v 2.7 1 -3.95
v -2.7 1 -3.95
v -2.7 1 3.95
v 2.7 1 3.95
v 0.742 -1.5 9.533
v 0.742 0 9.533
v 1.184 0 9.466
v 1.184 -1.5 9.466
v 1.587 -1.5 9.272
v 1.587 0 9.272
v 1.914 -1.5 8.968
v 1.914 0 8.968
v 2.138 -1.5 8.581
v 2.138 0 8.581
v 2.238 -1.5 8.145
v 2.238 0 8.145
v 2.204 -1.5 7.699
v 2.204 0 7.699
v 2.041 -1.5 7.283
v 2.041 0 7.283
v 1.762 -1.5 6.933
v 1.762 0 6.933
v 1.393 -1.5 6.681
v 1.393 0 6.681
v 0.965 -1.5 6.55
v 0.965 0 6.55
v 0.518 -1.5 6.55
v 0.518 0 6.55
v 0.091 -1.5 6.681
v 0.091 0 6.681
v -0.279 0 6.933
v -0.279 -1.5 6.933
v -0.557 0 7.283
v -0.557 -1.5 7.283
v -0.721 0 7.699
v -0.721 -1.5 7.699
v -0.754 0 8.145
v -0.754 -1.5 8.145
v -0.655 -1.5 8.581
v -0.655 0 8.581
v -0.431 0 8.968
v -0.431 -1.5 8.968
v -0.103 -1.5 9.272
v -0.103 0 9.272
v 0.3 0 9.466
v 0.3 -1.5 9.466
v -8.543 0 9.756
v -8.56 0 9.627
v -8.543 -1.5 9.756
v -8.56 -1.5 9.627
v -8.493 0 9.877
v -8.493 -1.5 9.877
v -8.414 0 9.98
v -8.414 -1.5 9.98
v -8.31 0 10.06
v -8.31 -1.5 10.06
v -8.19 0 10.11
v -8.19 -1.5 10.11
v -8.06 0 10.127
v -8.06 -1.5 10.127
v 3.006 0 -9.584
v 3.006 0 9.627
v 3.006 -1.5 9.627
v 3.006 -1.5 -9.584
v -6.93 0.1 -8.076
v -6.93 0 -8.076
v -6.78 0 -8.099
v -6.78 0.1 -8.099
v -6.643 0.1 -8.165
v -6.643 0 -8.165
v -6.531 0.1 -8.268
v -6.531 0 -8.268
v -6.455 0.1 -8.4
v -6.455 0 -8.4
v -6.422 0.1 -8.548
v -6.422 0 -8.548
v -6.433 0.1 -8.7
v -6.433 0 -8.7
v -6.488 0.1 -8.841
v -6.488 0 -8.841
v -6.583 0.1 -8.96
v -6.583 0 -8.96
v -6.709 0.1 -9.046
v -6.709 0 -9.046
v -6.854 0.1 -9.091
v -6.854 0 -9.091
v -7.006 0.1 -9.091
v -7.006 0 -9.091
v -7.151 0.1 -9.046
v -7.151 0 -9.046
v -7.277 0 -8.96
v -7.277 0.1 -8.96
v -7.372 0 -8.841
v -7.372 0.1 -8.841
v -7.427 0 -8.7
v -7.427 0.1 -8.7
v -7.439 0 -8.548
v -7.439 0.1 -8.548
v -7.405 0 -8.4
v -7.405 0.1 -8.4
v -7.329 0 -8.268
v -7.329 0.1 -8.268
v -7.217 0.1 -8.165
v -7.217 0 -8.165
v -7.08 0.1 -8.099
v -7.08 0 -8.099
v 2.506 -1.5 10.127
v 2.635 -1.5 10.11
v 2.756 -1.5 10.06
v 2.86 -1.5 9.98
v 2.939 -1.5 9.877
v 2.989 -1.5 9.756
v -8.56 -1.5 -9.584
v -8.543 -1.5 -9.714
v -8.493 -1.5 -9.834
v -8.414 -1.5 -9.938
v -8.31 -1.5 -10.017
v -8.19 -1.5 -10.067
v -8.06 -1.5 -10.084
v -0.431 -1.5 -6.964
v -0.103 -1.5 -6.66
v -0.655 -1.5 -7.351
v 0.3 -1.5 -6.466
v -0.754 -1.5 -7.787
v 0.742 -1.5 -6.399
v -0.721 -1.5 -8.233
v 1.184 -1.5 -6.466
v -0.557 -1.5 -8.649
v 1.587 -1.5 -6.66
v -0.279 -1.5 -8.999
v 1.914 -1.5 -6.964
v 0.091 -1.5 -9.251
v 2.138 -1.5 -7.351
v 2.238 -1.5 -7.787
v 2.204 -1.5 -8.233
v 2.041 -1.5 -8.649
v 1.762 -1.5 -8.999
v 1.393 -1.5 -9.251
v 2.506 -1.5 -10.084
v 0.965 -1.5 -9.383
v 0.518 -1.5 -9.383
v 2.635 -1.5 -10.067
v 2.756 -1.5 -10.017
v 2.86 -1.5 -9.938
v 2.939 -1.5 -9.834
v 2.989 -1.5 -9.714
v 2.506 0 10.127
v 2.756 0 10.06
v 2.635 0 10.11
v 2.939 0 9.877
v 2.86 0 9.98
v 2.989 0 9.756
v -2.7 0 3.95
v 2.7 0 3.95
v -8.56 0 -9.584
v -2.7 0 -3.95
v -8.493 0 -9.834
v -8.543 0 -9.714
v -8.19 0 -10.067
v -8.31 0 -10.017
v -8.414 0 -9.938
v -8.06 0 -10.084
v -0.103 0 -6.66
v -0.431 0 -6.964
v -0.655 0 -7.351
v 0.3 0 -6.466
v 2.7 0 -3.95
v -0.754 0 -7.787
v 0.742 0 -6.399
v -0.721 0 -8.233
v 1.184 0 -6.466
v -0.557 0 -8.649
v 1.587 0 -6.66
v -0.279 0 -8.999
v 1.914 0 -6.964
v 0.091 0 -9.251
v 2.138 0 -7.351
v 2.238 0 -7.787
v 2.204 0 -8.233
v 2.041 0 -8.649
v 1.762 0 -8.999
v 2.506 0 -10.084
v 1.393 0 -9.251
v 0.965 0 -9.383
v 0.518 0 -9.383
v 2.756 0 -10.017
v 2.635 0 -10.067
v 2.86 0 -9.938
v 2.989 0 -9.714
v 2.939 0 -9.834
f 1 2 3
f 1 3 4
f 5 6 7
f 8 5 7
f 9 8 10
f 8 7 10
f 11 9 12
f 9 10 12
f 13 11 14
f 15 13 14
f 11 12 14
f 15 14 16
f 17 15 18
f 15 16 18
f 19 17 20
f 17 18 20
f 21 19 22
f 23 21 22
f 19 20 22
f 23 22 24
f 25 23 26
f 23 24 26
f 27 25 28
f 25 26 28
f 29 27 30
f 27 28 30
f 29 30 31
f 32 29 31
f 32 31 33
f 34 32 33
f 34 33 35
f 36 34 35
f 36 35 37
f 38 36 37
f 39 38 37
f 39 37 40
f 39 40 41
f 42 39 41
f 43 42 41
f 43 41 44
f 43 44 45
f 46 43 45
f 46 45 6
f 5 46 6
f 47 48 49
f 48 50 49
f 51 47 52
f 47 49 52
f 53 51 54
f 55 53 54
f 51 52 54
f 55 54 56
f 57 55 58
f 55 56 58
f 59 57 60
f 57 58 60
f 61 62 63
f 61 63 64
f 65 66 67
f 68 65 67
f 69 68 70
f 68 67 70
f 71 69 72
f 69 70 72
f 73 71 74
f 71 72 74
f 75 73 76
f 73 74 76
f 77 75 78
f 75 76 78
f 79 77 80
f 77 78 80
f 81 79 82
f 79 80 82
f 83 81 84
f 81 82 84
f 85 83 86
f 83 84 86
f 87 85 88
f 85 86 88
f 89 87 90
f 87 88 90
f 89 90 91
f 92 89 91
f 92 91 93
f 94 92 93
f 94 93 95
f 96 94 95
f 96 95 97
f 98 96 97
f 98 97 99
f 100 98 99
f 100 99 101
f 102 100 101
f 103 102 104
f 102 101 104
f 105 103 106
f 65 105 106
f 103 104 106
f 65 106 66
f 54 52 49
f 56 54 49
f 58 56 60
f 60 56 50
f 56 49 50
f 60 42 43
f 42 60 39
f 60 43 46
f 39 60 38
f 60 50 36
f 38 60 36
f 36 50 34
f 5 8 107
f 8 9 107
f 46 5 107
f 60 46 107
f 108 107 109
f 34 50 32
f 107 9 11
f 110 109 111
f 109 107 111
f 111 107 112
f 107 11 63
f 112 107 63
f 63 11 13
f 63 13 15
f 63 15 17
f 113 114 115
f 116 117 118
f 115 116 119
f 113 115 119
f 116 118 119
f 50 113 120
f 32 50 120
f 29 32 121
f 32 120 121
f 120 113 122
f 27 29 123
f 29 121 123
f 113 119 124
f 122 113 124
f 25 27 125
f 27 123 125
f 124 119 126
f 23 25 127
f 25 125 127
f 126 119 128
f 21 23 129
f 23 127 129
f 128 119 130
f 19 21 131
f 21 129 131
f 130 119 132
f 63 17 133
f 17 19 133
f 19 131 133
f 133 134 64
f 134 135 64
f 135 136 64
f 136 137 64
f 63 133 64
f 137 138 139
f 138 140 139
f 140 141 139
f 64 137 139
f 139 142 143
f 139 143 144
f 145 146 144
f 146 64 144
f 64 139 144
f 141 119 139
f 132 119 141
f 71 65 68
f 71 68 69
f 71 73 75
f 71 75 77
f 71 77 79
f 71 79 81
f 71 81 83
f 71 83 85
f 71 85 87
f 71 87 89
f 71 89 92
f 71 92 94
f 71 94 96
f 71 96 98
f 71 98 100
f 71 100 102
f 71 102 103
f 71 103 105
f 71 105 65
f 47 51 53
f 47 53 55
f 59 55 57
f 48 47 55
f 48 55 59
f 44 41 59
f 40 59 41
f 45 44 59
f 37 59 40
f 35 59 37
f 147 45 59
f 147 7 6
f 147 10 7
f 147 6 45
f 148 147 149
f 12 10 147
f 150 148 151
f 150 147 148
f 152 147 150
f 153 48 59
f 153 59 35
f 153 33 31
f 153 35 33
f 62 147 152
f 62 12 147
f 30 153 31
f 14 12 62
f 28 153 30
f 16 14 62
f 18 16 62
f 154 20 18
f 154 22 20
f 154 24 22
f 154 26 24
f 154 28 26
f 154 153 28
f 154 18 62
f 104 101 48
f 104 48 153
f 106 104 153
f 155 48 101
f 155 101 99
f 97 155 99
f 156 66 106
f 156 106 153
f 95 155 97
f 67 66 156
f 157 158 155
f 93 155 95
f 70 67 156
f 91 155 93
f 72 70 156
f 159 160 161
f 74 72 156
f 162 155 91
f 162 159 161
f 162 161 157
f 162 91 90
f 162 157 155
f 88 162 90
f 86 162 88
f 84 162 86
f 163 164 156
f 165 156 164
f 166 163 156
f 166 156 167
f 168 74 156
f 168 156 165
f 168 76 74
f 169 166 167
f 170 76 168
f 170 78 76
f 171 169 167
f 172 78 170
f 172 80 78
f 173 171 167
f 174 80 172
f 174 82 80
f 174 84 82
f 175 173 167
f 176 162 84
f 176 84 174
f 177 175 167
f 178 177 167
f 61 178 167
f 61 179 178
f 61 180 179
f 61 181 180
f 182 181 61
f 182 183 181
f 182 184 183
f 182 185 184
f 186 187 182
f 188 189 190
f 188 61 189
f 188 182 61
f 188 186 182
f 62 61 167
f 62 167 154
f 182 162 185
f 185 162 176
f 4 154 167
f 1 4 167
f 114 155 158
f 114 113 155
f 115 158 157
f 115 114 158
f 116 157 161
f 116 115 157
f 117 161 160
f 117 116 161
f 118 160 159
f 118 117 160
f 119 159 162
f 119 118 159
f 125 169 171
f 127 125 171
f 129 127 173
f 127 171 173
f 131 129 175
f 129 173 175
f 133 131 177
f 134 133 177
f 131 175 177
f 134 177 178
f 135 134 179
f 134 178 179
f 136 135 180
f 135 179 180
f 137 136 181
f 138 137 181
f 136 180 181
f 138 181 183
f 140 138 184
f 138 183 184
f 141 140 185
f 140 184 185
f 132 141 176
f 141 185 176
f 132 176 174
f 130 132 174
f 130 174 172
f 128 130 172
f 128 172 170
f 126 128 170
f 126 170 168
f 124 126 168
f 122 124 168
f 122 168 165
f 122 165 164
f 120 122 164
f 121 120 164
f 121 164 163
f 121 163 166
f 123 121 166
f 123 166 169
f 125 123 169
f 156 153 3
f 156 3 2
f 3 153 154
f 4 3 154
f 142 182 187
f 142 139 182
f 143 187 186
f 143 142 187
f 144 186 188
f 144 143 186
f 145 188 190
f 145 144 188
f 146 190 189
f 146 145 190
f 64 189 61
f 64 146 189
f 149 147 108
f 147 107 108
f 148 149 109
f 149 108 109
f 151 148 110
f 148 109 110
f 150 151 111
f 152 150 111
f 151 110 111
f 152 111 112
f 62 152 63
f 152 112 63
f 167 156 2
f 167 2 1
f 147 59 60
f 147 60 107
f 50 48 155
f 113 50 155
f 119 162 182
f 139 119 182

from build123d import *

# Parameters (mm, degrees)
SKETCH1_W           = 11.566360694
SKETCH1_H           = 20.211316514
BOSS_EXTRUDE1_DEPTH = 1.5
SKETCH1_4_W         = 5.4
SKETCH1_4_H         = 7.9
BOSS_EXTRUDE2_DEPTH = 1
SKETCH1_5_R         = 0.51
BOSS_EXTRUDE3_DEPTH = 0.1
SKETCH2_R           = 1.5
CUT_EXTRUDE1_DEPTH  = 2.1
FILLET1_R           = 0.5


with BuildPart() as part:
    # Sketch1 → Boss-Extrude1 (new body)
    with BuildSketch(Plane(origin=(0, 0, 0), x_dir=(1, 0, 0), z_dir=(0, 1, 0))):
        with Locations((-2.777214228, -0.021219212)):
            Rectangle(SKETCH1_W, SKETCH1_H)
    extrude(amount=-BOSS_EXTRUDE1_DEPTH)

    # Sketch1<4> → Boss-Extrude2 (add)
    with BuildSketch(Plane(origin=(0, 0, 0), x_dir=(1, 0, 0), z_dir=(0, 1, 0))):
        Rectangle(SKETCH1_4_W, SKETCH1_4_H)
    extrude(amount=BOSS_EXTRUDE2_DEPTH)

    # Sketch1<5> → Boss-Extrude3 (add)
    with BuildSketch(Plane(origin=(0, 0, 0), x_dir=(1, 0, 0), z_dir=(0, 1, 0))):
        with Locations((-6.930111953, 8.586389213)):
            Circle(SKETCH1_5_R)
    extrude(amount=BOSS_EXTRUDE3_DEPTH)

    # Sketch2 → Cut-Extrude1 (cut)
    with BuildSketch(Plane(origin=(0, 0, 0), x_dir=(1, 0, 0), z_dir=(0, 1, 0))):
        with Locations((0.741742268, 7.899498536)):
            Circle(SKETCH2_R)
        with Locations((0.741742268, -8.032859578)):
            Circle(SKETCH2_R)
    extrude(amount=-CUT_EXTRUDE1_DEPTH, mode=Mode.SUBTRACT)

    # Fillet1
    fillet1_edges = [part.edges().sort_by_distance(p)[0] for p in [
        (3.005966119, -0.75, -10.084439045),
        (-8.560394575, -0.75, -10.084439045),
        (-8.560394575, -0.75, 10.126877469),
        (3.005966119, -0.75, 10.126877469),
    ]]
    fillet(fillet1_edges, radius=FILLET1_R)


solid = part.part
